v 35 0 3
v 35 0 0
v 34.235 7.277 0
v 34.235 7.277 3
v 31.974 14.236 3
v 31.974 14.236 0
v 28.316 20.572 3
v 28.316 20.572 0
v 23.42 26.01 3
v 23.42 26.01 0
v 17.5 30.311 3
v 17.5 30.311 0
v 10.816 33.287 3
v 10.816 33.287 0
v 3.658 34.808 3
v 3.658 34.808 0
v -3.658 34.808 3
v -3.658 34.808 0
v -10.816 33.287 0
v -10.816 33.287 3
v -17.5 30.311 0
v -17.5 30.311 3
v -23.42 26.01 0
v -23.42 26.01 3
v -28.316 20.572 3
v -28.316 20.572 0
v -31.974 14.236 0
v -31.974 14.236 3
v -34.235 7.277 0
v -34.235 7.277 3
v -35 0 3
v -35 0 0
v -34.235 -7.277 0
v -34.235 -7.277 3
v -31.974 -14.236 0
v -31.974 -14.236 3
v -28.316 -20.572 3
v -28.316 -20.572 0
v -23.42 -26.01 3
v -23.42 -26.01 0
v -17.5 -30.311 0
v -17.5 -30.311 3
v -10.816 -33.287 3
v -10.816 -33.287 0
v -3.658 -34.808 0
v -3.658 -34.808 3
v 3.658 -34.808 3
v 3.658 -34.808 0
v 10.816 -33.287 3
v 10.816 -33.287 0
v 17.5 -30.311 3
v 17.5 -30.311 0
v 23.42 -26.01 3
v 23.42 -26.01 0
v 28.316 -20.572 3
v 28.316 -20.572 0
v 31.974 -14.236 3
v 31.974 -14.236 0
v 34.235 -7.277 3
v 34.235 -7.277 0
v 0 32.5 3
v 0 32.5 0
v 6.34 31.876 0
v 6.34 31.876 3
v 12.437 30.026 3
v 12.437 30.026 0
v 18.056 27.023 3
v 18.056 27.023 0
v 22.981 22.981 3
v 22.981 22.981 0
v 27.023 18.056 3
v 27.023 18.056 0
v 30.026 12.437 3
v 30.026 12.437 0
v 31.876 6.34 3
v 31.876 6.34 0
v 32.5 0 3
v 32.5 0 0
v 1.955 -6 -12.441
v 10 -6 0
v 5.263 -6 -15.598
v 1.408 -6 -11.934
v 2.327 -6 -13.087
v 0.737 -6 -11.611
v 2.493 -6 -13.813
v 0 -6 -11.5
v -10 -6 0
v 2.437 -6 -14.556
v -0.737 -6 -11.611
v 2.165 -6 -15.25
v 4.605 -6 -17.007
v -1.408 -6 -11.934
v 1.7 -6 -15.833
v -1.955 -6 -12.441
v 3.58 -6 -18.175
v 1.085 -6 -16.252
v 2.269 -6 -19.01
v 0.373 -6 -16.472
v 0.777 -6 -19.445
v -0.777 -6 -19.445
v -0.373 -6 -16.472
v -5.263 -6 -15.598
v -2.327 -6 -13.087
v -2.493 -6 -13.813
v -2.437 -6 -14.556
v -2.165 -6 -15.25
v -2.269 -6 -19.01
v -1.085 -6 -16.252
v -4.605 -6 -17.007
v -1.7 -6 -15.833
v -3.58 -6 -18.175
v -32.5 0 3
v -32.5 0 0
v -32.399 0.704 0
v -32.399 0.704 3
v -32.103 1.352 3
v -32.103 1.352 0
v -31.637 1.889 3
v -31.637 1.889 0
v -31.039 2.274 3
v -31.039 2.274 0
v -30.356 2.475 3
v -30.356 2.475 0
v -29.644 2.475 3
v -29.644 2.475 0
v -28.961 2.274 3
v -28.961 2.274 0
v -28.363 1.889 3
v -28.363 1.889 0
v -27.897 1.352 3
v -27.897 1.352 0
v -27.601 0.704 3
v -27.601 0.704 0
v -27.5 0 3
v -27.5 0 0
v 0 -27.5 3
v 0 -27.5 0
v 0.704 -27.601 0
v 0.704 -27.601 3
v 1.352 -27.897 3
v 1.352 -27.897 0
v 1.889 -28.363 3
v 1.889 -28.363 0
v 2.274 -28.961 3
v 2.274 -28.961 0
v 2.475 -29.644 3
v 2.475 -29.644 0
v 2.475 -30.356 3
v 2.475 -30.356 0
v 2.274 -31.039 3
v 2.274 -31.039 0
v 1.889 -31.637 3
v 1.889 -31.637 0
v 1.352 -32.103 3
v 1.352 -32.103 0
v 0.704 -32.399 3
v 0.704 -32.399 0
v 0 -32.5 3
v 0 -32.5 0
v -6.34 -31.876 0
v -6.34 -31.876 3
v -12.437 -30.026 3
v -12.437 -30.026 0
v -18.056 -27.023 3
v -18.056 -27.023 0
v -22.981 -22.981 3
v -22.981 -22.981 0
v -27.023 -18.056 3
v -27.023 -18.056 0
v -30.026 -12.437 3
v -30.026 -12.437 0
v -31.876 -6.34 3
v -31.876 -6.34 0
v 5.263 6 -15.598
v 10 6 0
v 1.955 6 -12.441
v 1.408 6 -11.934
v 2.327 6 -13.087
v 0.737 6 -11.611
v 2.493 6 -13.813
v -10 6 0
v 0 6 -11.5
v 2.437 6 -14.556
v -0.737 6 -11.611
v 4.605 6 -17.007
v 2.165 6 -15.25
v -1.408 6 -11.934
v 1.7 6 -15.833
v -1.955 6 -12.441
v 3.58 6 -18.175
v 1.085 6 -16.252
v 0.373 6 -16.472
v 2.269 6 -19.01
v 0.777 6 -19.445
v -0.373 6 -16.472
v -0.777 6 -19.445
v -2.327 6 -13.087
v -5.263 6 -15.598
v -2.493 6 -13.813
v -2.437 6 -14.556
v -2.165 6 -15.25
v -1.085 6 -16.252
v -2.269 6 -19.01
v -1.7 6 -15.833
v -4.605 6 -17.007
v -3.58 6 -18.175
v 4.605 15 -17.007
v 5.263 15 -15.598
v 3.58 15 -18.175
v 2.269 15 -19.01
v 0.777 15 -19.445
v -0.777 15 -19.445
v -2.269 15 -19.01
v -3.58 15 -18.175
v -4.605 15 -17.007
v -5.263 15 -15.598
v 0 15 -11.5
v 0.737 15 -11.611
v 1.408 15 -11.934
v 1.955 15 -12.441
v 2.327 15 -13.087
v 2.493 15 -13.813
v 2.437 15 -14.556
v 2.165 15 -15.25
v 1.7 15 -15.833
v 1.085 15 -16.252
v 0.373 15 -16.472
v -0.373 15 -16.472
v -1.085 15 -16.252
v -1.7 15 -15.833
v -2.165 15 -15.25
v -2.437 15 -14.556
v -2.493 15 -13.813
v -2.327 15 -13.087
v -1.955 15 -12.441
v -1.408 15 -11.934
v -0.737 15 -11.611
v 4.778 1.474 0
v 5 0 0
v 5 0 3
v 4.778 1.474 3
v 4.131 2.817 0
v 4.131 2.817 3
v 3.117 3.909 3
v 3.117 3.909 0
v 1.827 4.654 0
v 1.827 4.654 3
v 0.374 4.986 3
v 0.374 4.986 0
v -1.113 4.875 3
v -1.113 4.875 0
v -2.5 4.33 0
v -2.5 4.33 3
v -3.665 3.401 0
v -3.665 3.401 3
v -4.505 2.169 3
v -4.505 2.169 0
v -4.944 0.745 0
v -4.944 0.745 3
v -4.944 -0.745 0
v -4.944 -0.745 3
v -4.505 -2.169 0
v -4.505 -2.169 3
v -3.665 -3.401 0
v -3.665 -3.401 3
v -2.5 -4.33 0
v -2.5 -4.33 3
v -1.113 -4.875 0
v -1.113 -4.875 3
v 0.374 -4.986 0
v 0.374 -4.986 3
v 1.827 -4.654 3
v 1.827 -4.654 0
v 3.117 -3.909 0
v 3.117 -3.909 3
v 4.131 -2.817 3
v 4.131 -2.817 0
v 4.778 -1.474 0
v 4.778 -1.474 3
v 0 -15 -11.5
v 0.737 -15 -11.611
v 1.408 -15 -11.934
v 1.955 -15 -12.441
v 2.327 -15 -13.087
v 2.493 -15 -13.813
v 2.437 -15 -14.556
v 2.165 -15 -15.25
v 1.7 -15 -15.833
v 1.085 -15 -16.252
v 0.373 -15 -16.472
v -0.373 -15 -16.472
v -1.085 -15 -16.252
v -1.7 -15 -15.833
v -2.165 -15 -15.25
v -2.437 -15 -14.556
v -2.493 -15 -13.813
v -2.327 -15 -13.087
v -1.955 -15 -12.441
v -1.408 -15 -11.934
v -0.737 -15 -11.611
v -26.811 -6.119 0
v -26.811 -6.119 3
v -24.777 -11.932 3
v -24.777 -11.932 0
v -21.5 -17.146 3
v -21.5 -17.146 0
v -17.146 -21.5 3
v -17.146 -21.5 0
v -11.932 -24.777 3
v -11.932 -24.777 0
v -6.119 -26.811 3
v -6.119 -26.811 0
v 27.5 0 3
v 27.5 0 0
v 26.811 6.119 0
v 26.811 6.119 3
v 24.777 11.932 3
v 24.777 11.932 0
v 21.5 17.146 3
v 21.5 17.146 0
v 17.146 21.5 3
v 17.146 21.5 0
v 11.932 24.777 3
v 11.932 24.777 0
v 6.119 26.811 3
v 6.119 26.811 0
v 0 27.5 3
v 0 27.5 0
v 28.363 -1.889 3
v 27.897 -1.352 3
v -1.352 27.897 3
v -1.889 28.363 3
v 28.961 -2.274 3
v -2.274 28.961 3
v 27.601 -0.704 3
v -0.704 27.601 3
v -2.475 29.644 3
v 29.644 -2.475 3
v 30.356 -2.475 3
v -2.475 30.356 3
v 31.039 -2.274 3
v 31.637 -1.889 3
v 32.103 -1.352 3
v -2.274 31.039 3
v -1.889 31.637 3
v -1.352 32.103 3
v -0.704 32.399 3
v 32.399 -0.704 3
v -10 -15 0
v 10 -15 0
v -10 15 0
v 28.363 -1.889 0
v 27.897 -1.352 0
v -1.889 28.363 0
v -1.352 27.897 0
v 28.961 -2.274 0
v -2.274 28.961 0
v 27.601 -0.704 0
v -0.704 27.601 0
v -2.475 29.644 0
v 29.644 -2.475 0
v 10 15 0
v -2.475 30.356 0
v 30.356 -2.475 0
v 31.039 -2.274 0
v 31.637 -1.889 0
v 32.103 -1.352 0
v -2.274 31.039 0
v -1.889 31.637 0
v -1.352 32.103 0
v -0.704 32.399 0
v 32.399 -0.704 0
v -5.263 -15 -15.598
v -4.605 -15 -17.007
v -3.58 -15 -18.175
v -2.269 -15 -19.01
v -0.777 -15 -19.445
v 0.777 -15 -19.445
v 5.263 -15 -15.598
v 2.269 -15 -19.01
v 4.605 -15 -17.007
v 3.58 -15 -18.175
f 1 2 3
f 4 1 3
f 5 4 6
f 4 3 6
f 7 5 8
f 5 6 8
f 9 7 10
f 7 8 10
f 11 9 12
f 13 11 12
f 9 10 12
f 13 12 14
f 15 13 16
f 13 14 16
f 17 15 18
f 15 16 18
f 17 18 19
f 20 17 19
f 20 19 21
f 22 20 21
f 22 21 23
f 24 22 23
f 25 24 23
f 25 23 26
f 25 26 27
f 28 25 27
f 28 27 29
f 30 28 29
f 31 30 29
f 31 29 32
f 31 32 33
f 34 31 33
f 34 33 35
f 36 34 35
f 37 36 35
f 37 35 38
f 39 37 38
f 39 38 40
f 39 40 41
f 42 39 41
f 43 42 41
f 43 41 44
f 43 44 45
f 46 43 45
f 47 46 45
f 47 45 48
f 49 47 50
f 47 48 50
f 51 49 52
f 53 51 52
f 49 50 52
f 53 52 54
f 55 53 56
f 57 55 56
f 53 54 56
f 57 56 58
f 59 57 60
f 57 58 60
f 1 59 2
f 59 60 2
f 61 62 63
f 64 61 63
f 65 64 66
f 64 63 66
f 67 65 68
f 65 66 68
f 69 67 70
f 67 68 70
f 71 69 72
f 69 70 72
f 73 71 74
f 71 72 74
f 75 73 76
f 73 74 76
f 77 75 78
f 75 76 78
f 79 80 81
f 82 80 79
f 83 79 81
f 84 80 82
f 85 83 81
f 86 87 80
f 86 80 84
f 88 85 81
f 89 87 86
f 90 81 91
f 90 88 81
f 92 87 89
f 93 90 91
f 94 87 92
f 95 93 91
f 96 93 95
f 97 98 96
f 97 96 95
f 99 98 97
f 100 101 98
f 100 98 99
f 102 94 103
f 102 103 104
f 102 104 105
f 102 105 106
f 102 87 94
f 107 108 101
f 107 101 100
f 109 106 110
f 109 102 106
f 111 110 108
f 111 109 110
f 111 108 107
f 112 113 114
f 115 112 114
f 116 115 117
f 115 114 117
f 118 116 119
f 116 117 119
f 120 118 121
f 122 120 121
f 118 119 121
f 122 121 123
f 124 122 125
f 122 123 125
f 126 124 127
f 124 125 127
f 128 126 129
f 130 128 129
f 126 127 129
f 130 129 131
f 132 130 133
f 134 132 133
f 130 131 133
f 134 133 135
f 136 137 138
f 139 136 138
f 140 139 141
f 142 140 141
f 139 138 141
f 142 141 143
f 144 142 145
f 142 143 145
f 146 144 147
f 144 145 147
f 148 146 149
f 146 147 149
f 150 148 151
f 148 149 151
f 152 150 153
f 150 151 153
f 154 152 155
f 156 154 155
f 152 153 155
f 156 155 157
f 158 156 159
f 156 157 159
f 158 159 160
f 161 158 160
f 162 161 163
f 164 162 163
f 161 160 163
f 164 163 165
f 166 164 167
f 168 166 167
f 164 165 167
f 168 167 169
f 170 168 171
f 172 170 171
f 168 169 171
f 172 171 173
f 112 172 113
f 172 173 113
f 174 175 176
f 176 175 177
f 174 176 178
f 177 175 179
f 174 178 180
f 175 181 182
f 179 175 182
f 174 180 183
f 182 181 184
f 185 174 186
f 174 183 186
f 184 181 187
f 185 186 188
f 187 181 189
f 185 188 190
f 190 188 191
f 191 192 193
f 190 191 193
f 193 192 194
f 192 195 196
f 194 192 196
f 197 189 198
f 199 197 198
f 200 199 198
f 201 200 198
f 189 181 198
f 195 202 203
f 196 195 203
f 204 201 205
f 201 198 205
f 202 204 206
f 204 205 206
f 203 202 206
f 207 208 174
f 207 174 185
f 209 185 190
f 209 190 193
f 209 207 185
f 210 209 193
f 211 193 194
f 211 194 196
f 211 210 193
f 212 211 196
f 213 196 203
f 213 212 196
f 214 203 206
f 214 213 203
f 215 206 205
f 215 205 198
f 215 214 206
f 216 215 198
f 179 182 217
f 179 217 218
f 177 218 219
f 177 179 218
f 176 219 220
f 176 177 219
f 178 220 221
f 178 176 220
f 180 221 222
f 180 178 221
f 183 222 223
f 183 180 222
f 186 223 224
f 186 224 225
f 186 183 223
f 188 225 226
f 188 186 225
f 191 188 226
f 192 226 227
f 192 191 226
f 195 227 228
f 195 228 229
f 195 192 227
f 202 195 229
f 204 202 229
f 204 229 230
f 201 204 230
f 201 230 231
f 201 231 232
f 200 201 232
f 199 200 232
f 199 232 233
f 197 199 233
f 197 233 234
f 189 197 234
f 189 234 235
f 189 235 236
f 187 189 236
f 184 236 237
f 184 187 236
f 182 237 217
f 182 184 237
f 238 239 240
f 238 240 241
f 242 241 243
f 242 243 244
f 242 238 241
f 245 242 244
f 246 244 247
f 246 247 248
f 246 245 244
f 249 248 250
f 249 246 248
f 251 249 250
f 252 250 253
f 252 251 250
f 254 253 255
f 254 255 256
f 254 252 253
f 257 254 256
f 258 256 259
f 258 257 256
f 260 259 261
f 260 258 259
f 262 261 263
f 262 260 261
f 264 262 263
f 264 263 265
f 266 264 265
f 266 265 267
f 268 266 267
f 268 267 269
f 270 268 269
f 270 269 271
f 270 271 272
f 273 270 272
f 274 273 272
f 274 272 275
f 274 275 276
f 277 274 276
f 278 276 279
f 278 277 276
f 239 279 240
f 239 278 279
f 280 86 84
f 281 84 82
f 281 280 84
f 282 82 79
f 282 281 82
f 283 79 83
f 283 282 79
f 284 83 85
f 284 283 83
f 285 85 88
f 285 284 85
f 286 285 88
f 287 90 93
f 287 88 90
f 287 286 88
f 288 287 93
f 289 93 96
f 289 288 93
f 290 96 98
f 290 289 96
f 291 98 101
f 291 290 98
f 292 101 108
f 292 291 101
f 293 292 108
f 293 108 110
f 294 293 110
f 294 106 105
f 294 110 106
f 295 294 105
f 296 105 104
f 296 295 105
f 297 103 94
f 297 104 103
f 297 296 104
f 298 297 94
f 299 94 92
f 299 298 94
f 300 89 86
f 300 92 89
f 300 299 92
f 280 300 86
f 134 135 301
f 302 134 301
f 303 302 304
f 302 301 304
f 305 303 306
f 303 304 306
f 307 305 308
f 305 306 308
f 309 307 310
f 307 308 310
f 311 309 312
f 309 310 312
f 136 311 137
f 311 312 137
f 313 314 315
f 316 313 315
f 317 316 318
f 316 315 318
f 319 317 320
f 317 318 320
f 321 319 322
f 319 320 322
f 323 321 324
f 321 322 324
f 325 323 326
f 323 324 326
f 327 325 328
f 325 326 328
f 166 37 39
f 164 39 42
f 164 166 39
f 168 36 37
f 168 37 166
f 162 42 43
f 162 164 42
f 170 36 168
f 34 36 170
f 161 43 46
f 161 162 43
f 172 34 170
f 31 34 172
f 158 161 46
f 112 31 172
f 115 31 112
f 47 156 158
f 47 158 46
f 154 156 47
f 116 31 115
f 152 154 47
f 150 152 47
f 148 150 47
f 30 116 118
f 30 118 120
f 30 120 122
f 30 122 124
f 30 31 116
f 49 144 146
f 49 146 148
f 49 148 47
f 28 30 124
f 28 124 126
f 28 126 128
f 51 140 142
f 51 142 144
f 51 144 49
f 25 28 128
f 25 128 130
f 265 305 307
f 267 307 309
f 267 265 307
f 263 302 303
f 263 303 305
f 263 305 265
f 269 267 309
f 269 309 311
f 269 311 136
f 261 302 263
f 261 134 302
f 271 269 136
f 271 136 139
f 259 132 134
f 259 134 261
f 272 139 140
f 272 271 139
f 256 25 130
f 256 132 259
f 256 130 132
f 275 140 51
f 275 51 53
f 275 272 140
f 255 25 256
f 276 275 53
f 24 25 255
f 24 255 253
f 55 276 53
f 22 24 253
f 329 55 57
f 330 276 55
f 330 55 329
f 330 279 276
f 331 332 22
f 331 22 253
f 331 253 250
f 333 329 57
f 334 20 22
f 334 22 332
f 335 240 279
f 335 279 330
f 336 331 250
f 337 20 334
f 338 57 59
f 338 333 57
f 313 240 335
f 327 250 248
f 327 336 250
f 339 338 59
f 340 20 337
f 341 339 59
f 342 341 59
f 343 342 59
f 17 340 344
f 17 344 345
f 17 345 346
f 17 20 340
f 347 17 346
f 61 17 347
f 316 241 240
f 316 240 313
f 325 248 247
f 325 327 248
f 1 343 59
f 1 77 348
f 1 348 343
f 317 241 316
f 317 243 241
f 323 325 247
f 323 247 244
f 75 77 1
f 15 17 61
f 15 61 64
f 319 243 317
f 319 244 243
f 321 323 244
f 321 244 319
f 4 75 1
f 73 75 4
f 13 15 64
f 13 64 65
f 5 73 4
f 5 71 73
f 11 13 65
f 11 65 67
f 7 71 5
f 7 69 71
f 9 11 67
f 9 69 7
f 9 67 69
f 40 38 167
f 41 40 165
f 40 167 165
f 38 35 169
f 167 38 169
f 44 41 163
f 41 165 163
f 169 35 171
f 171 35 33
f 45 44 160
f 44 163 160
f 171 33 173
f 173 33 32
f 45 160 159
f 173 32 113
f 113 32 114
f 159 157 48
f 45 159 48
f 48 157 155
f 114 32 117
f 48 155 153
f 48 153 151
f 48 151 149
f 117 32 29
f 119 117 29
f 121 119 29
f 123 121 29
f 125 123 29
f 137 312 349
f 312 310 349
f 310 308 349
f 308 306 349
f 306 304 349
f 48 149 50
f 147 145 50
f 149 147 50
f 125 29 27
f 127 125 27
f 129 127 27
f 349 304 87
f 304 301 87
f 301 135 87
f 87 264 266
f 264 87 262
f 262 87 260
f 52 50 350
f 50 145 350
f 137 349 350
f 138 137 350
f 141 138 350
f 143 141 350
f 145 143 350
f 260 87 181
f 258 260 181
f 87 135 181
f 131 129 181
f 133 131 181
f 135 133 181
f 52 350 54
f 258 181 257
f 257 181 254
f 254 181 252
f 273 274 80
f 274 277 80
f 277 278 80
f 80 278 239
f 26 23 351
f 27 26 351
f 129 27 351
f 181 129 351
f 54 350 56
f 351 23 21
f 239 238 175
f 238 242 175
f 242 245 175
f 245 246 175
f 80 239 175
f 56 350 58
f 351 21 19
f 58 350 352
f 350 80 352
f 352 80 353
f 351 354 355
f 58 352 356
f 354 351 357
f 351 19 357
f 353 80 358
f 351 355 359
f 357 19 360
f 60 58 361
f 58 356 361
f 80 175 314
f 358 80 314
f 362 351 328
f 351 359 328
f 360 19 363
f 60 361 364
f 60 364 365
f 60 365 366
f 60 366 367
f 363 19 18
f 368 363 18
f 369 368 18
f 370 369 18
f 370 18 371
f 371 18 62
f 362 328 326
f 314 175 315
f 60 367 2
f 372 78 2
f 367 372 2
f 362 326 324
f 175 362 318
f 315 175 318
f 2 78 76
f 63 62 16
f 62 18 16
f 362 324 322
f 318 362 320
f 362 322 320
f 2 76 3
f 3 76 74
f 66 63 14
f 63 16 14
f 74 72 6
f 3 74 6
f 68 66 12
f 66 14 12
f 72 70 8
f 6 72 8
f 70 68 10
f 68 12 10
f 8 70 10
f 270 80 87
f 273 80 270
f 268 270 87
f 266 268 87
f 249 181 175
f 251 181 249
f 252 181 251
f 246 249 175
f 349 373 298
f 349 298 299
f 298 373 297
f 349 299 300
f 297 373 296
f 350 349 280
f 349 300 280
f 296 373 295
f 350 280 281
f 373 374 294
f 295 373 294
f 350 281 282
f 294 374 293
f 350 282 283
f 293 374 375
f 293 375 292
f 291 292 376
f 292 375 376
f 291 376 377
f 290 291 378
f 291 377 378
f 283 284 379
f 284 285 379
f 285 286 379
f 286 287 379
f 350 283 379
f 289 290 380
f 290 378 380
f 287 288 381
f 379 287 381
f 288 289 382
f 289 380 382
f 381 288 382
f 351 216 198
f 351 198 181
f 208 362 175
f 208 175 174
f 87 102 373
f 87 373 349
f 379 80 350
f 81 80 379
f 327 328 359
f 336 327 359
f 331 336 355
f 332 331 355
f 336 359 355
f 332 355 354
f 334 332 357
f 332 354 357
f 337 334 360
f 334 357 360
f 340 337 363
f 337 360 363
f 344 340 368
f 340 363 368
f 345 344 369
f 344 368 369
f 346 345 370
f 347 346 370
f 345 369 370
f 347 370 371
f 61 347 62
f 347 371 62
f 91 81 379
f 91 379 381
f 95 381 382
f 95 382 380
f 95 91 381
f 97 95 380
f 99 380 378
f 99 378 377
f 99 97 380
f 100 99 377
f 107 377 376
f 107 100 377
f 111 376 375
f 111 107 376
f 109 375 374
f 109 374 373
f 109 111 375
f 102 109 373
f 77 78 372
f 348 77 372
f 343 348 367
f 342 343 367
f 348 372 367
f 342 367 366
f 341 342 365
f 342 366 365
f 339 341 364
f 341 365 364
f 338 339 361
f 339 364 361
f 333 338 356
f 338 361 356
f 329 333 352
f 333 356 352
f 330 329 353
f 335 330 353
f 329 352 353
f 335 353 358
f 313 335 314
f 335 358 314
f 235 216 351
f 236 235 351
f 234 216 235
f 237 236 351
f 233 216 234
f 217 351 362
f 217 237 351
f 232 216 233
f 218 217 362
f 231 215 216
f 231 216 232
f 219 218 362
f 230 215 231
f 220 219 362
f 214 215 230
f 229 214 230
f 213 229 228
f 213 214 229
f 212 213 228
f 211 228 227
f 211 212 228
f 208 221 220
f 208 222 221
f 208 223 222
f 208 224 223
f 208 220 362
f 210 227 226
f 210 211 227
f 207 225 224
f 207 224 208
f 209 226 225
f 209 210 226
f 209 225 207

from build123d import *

# Parameters (mm, degrees)
SKETCH_5_R               = 2.5
EXTRUDE_3_DEPTH          = 15
SKETCH_1_R               = 35
SKETCH_1_R_2             = 5
EXTRUDE_4_DEPTH          = 3
CUT_EXTRUDE_1_DEPTH      = 54.200093985
CUT_EXTRUDE_1_DEPTH_BACK = 54.200093985
SKETCH_4_W               = 25
SKETCH_4_H               = 12


with BuildPart() as part:
    # 스케치5 → 보스-돌출3 (new, symmetric)
    with BuildSketch(Plane(origin=(0, 0, 0), x_dir=(1, 0, 0), z_dir=(0, 1, 0))):
        with BuildLine():
            Line((-10, 0), (10, 0))
            Line((10, 0), (5.262640911, 15.598314937))
            ThreePointArc((5.262640911, 15.598314937), (0, 19.5), (-5.262640911, 15.598314937))
            Line((-5.262640911, 15.598314937), (-10, 0))
        make_face()
        with Locations(Location((0, 14, 0), (0, 0, 270))):
            Circle(SKETCH_5_R, mode=Mode.SUBTRACT)
    extrude(amount=EXTRUDE_3_DEPTH, both=True)

    # 스케치1 → 보스-돌출4 (add)
    with BuildSketch(Plane.XY):
        Circle(SKETCH_1_R)
        with BuildLine():
            ThreePointArc((32.5, 0), (30, -2.5), (27.5, 0))
            ThreePointArc((27.5, 0), (19.445436483, 19.445436483), (0, 27.5))
            ThreePointArc((0, 27.5), (-2.5, 30), (0, 32.5))
            ThreePointArc((0, 32.5), (22.980970389, 22.980970389), (32.5, 0))
        make_face(mode=Mode.SUBTRACT)
        with BuildLine():
            ThreePointArc((0, -27.5), (2.5, -30), (0, -32.5))
            ThreePointArc((0, -32.5), (-22.980970405, -22.980970372), (-32.5, 4.6e-08))
            ThreePointArc((-32.5, 4.6e-08), (-29.999999977, 2.5), (-27.5, 0))
            ThreePointArc((-27.5, 0), (-19.445436483, -19.445436483), (0, -27.5))
        make_face(mode=Mode.SUBTRACT)
        Circle(SKETCH_1_R_2, mode=Mode.SUBTRACT)
    extrude(amount=EXTRUDE_4_DEPTH)

    # 스케치4 → 컷-돌출1 (cut, two sides: drawn at the far end of the back side and taken through both)
    with BuildSketch(Plane(origin=(0, 0, 0), x_dir=(0, 0, -1), z_dir=(1, 0, 0)).offset(-CUT_EXTRUDE_1_DEPTH_BACK)):
        with Locations((12.5, 0)):
            Rectangle(SKETCH_4_W, SKETCH_4_H)
    extrude(amount=CUT_EXTRUDE_1_DEPTH + CUT_EXTRUDE_1_DEPTH_BACK, mode=Mode.SUBTRACT)


solid = part.part
